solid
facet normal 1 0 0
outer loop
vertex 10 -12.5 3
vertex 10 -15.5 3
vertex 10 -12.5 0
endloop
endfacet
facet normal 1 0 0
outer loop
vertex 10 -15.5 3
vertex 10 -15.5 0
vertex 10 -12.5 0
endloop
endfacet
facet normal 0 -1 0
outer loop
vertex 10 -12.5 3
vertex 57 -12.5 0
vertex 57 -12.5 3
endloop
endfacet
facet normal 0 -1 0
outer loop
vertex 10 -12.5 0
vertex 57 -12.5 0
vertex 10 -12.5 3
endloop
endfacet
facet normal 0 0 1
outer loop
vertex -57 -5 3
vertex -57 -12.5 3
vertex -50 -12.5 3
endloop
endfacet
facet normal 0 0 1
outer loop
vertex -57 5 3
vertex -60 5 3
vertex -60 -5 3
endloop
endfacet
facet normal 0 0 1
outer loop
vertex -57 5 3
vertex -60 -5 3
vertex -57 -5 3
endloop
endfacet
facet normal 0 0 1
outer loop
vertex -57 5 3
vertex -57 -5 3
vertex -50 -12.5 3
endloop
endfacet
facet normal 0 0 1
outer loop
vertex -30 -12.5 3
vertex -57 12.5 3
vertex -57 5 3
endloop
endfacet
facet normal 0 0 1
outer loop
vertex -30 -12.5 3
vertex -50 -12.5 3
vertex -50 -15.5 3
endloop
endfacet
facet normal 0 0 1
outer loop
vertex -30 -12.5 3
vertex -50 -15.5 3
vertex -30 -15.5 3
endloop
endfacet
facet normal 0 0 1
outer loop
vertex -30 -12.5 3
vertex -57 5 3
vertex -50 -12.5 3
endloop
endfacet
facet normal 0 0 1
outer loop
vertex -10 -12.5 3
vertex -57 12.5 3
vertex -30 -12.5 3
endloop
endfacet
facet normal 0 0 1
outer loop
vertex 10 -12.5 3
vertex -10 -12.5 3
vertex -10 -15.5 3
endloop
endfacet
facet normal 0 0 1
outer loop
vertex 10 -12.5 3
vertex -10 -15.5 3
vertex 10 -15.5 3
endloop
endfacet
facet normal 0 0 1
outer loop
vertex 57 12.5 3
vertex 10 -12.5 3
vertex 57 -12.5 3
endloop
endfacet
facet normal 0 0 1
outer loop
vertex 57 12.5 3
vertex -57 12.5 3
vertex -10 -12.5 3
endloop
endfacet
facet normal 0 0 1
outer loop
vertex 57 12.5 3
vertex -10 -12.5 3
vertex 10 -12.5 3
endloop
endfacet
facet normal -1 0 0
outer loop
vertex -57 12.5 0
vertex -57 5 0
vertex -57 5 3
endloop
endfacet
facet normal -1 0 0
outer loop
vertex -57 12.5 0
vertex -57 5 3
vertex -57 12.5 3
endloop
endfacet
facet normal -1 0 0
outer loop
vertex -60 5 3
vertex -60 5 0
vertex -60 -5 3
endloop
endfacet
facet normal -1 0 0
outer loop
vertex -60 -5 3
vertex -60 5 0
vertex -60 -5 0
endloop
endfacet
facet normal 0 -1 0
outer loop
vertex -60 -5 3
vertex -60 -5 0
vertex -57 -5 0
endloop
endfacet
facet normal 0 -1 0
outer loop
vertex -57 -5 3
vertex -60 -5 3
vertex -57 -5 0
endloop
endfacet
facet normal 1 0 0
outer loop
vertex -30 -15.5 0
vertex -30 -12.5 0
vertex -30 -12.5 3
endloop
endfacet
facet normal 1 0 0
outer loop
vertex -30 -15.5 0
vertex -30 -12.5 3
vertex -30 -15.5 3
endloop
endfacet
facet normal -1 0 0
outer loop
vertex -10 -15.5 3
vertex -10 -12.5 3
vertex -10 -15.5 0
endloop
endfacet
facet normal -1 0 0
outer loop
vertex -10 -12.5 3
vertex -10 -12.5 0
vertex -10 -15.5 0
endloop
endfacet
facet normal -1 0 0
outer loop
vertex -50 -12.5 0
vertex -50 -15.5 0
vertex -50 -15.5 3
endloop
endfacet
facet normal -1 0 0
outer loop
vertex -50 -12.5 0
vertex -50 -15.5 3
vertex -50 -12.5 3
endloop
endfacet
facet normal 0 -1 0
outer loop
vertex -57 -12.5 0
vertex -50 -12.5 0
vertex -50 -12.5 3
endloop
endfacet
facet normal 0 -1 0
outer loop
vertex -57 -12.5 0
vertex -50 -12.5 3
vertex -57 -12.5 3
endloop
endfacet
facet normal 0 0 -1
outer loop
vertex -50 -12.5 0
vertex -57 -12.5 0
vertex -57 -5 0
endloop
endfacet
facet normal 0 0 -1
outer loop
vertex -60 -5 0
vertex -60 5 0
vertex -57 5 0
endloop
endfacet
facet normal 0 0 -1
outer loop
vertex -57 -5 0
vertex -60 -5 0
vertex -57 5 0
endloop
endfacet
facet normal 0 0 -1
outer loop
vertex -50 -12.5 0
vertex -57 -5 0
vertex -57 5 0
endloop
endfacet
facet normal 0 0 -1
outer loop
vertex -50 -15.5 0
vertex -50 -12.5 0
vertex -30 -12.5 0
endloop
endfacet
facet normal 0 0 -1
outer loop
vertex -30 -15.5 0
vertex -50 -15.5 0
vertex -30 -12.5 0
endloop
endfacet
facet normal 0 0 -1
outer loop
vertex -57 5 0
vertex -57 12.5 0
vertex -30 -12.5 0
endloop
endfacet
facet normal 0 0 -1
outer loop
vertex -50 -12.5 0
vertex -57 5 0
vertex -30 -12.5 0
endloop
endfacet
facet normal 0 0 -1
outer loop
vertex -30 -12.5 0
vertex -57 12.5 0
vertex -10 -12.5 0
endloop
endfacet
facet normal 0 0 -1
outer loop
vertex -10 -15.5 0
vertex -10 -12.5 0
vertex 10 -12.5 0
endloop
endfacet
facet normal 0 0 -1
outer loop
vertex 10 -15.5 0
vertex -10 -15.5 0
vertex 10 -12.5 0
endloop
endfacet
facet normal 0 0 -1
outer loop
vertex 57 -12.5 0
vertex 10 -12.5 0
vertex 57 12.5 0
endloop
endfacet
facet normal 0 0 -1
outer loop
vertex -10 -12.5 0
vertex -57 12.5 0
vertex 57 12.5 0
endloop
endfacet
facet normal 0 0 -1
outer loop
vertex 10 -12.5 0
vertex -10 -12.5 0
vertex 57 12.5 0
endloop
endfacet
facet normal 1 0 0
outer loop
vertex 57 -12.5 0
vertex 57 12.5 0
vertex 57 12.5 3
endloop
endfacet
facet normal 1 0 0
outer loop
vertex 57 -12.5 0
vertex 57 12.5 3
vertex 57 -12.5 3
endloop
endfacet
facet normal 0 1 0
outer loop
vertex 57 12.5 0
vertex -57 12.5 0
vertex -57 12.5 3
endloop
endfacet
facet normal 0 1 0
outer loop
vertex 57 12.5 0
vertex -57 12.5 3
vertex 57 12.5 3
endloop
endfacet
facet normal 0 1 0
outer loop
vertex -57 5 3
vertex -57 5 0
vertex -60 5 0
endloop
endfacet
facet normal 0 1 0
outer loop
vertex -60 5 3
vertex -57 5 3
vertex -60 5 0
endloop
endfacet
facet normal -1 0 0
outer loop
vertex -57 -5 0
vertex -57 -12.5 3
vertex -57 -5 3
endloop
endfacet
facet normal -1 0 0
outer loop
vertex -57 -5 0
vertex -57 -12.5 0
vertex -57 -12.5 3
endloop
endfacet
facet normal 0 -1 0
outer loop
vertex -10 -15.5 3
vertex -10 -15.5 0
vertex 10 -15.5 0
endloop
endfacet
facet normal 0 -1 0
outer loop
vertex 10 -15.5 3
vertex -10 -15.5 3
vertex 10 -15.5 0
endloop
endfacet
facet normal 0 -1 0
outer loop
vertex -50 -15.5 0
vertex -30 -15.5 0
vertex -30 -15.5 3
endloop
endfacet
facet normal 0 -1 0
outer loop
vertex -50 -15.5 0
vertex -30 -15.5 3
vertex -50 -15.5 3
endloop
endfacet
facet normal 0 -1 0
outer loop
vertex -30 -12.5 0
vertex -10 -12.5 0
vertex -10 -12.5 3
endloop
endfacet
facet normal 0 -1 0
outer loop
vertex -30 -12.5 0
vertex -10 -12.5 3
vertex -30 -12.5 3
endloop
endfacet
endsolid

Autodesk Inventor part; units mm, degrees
ref_plane "YZ Plane" through (0, 0, 0) normal (1, 0, 0) x (0, 1, 0)
ref_plane "XZ Plane" through (0, 0, 0) normal (0, 1, 0) x (-1, 0, 0)
ref_plane "XY Plane" through (0, 0, 0) normal (0, 0, 1) x (1, 0, 0)
sketch "Sketch1" plane through (0, 0, 0) normal (0, 0, 1) x (1, 0, 0)
  line L0 (57, -12.5) -> (-57, -12.5)
  line L1 (-57, -12.5) -> (-57, 12.5)
  line L2 (-57, 12.5) -> (57, 12.5)
  line L3 (57, 12.5) -> (57, -12.5)
  line L4 (57, -12.5) -> (-57, 12.5) construction
  line L5 (-57, -12.5) -> (57, 12.5) construction
  point P0 (0, 0)
  dimension "d0" = 57
  dimension "d1" = 25
extrude "Extrusion1" add sketch "Sketch1" along normal blind 3
sketch "Sketch2" plane through (0, 0, 0) normal (0, 0, -1) x (-1, 0, 0)
  line L0 (57, 12.5) -> (57, -12.5) projected
  line L1 (57, 5) -> (60, 5)
  line L2 (60, 5) -> (60, -5)
  line L3 (60, -5) -> (57, -5)
  line L4 (57, -5) -> (57, 5)
  point P0 (0, 0)
  point P1 (60, 0)
  dimension "d4" = 3
  dimension "d5" = 10
extrude "Extrusion2" add sketch "Sketch2" against normal blind 3
sketch "Sketch3" plane through (0, 0, 0) normal (0, 0, -1) x (-1, 0, 0)
  line L0 (-57, -12.5) -> (57, -12.5) projected
  line L1 (50, -12.5) -> (30, -12.5)
  line L2 (30, -12.5) -> (30, -15.5)
  line L3 (30, -15.5) -> (50, -15.5)
  line L4 (50, -15.5) -> (50, -12.5)
  line L5 (-10, -12.5) -> (10, -12.5)
  line L6 (10, -12.5) -> (10, -15.5)
  line L7 (10, -15.5) -> (-10, -15.5)
  line L8 (-10, -15.5) -> (-10, -12.5)
  point P0 (0, 0)
  point P1 (0, -15.5)
  dimension "d8" = 20
  dimension "d9" = 3
  dimension "d10" = 30
  dimension "d11" = 20
  dimension "d12" = 3
  dimension "d13" = 20
extrude "Extrusion3" add sketch "Sketch3" against normal blind 3
properties part number "motor reinforcment"
